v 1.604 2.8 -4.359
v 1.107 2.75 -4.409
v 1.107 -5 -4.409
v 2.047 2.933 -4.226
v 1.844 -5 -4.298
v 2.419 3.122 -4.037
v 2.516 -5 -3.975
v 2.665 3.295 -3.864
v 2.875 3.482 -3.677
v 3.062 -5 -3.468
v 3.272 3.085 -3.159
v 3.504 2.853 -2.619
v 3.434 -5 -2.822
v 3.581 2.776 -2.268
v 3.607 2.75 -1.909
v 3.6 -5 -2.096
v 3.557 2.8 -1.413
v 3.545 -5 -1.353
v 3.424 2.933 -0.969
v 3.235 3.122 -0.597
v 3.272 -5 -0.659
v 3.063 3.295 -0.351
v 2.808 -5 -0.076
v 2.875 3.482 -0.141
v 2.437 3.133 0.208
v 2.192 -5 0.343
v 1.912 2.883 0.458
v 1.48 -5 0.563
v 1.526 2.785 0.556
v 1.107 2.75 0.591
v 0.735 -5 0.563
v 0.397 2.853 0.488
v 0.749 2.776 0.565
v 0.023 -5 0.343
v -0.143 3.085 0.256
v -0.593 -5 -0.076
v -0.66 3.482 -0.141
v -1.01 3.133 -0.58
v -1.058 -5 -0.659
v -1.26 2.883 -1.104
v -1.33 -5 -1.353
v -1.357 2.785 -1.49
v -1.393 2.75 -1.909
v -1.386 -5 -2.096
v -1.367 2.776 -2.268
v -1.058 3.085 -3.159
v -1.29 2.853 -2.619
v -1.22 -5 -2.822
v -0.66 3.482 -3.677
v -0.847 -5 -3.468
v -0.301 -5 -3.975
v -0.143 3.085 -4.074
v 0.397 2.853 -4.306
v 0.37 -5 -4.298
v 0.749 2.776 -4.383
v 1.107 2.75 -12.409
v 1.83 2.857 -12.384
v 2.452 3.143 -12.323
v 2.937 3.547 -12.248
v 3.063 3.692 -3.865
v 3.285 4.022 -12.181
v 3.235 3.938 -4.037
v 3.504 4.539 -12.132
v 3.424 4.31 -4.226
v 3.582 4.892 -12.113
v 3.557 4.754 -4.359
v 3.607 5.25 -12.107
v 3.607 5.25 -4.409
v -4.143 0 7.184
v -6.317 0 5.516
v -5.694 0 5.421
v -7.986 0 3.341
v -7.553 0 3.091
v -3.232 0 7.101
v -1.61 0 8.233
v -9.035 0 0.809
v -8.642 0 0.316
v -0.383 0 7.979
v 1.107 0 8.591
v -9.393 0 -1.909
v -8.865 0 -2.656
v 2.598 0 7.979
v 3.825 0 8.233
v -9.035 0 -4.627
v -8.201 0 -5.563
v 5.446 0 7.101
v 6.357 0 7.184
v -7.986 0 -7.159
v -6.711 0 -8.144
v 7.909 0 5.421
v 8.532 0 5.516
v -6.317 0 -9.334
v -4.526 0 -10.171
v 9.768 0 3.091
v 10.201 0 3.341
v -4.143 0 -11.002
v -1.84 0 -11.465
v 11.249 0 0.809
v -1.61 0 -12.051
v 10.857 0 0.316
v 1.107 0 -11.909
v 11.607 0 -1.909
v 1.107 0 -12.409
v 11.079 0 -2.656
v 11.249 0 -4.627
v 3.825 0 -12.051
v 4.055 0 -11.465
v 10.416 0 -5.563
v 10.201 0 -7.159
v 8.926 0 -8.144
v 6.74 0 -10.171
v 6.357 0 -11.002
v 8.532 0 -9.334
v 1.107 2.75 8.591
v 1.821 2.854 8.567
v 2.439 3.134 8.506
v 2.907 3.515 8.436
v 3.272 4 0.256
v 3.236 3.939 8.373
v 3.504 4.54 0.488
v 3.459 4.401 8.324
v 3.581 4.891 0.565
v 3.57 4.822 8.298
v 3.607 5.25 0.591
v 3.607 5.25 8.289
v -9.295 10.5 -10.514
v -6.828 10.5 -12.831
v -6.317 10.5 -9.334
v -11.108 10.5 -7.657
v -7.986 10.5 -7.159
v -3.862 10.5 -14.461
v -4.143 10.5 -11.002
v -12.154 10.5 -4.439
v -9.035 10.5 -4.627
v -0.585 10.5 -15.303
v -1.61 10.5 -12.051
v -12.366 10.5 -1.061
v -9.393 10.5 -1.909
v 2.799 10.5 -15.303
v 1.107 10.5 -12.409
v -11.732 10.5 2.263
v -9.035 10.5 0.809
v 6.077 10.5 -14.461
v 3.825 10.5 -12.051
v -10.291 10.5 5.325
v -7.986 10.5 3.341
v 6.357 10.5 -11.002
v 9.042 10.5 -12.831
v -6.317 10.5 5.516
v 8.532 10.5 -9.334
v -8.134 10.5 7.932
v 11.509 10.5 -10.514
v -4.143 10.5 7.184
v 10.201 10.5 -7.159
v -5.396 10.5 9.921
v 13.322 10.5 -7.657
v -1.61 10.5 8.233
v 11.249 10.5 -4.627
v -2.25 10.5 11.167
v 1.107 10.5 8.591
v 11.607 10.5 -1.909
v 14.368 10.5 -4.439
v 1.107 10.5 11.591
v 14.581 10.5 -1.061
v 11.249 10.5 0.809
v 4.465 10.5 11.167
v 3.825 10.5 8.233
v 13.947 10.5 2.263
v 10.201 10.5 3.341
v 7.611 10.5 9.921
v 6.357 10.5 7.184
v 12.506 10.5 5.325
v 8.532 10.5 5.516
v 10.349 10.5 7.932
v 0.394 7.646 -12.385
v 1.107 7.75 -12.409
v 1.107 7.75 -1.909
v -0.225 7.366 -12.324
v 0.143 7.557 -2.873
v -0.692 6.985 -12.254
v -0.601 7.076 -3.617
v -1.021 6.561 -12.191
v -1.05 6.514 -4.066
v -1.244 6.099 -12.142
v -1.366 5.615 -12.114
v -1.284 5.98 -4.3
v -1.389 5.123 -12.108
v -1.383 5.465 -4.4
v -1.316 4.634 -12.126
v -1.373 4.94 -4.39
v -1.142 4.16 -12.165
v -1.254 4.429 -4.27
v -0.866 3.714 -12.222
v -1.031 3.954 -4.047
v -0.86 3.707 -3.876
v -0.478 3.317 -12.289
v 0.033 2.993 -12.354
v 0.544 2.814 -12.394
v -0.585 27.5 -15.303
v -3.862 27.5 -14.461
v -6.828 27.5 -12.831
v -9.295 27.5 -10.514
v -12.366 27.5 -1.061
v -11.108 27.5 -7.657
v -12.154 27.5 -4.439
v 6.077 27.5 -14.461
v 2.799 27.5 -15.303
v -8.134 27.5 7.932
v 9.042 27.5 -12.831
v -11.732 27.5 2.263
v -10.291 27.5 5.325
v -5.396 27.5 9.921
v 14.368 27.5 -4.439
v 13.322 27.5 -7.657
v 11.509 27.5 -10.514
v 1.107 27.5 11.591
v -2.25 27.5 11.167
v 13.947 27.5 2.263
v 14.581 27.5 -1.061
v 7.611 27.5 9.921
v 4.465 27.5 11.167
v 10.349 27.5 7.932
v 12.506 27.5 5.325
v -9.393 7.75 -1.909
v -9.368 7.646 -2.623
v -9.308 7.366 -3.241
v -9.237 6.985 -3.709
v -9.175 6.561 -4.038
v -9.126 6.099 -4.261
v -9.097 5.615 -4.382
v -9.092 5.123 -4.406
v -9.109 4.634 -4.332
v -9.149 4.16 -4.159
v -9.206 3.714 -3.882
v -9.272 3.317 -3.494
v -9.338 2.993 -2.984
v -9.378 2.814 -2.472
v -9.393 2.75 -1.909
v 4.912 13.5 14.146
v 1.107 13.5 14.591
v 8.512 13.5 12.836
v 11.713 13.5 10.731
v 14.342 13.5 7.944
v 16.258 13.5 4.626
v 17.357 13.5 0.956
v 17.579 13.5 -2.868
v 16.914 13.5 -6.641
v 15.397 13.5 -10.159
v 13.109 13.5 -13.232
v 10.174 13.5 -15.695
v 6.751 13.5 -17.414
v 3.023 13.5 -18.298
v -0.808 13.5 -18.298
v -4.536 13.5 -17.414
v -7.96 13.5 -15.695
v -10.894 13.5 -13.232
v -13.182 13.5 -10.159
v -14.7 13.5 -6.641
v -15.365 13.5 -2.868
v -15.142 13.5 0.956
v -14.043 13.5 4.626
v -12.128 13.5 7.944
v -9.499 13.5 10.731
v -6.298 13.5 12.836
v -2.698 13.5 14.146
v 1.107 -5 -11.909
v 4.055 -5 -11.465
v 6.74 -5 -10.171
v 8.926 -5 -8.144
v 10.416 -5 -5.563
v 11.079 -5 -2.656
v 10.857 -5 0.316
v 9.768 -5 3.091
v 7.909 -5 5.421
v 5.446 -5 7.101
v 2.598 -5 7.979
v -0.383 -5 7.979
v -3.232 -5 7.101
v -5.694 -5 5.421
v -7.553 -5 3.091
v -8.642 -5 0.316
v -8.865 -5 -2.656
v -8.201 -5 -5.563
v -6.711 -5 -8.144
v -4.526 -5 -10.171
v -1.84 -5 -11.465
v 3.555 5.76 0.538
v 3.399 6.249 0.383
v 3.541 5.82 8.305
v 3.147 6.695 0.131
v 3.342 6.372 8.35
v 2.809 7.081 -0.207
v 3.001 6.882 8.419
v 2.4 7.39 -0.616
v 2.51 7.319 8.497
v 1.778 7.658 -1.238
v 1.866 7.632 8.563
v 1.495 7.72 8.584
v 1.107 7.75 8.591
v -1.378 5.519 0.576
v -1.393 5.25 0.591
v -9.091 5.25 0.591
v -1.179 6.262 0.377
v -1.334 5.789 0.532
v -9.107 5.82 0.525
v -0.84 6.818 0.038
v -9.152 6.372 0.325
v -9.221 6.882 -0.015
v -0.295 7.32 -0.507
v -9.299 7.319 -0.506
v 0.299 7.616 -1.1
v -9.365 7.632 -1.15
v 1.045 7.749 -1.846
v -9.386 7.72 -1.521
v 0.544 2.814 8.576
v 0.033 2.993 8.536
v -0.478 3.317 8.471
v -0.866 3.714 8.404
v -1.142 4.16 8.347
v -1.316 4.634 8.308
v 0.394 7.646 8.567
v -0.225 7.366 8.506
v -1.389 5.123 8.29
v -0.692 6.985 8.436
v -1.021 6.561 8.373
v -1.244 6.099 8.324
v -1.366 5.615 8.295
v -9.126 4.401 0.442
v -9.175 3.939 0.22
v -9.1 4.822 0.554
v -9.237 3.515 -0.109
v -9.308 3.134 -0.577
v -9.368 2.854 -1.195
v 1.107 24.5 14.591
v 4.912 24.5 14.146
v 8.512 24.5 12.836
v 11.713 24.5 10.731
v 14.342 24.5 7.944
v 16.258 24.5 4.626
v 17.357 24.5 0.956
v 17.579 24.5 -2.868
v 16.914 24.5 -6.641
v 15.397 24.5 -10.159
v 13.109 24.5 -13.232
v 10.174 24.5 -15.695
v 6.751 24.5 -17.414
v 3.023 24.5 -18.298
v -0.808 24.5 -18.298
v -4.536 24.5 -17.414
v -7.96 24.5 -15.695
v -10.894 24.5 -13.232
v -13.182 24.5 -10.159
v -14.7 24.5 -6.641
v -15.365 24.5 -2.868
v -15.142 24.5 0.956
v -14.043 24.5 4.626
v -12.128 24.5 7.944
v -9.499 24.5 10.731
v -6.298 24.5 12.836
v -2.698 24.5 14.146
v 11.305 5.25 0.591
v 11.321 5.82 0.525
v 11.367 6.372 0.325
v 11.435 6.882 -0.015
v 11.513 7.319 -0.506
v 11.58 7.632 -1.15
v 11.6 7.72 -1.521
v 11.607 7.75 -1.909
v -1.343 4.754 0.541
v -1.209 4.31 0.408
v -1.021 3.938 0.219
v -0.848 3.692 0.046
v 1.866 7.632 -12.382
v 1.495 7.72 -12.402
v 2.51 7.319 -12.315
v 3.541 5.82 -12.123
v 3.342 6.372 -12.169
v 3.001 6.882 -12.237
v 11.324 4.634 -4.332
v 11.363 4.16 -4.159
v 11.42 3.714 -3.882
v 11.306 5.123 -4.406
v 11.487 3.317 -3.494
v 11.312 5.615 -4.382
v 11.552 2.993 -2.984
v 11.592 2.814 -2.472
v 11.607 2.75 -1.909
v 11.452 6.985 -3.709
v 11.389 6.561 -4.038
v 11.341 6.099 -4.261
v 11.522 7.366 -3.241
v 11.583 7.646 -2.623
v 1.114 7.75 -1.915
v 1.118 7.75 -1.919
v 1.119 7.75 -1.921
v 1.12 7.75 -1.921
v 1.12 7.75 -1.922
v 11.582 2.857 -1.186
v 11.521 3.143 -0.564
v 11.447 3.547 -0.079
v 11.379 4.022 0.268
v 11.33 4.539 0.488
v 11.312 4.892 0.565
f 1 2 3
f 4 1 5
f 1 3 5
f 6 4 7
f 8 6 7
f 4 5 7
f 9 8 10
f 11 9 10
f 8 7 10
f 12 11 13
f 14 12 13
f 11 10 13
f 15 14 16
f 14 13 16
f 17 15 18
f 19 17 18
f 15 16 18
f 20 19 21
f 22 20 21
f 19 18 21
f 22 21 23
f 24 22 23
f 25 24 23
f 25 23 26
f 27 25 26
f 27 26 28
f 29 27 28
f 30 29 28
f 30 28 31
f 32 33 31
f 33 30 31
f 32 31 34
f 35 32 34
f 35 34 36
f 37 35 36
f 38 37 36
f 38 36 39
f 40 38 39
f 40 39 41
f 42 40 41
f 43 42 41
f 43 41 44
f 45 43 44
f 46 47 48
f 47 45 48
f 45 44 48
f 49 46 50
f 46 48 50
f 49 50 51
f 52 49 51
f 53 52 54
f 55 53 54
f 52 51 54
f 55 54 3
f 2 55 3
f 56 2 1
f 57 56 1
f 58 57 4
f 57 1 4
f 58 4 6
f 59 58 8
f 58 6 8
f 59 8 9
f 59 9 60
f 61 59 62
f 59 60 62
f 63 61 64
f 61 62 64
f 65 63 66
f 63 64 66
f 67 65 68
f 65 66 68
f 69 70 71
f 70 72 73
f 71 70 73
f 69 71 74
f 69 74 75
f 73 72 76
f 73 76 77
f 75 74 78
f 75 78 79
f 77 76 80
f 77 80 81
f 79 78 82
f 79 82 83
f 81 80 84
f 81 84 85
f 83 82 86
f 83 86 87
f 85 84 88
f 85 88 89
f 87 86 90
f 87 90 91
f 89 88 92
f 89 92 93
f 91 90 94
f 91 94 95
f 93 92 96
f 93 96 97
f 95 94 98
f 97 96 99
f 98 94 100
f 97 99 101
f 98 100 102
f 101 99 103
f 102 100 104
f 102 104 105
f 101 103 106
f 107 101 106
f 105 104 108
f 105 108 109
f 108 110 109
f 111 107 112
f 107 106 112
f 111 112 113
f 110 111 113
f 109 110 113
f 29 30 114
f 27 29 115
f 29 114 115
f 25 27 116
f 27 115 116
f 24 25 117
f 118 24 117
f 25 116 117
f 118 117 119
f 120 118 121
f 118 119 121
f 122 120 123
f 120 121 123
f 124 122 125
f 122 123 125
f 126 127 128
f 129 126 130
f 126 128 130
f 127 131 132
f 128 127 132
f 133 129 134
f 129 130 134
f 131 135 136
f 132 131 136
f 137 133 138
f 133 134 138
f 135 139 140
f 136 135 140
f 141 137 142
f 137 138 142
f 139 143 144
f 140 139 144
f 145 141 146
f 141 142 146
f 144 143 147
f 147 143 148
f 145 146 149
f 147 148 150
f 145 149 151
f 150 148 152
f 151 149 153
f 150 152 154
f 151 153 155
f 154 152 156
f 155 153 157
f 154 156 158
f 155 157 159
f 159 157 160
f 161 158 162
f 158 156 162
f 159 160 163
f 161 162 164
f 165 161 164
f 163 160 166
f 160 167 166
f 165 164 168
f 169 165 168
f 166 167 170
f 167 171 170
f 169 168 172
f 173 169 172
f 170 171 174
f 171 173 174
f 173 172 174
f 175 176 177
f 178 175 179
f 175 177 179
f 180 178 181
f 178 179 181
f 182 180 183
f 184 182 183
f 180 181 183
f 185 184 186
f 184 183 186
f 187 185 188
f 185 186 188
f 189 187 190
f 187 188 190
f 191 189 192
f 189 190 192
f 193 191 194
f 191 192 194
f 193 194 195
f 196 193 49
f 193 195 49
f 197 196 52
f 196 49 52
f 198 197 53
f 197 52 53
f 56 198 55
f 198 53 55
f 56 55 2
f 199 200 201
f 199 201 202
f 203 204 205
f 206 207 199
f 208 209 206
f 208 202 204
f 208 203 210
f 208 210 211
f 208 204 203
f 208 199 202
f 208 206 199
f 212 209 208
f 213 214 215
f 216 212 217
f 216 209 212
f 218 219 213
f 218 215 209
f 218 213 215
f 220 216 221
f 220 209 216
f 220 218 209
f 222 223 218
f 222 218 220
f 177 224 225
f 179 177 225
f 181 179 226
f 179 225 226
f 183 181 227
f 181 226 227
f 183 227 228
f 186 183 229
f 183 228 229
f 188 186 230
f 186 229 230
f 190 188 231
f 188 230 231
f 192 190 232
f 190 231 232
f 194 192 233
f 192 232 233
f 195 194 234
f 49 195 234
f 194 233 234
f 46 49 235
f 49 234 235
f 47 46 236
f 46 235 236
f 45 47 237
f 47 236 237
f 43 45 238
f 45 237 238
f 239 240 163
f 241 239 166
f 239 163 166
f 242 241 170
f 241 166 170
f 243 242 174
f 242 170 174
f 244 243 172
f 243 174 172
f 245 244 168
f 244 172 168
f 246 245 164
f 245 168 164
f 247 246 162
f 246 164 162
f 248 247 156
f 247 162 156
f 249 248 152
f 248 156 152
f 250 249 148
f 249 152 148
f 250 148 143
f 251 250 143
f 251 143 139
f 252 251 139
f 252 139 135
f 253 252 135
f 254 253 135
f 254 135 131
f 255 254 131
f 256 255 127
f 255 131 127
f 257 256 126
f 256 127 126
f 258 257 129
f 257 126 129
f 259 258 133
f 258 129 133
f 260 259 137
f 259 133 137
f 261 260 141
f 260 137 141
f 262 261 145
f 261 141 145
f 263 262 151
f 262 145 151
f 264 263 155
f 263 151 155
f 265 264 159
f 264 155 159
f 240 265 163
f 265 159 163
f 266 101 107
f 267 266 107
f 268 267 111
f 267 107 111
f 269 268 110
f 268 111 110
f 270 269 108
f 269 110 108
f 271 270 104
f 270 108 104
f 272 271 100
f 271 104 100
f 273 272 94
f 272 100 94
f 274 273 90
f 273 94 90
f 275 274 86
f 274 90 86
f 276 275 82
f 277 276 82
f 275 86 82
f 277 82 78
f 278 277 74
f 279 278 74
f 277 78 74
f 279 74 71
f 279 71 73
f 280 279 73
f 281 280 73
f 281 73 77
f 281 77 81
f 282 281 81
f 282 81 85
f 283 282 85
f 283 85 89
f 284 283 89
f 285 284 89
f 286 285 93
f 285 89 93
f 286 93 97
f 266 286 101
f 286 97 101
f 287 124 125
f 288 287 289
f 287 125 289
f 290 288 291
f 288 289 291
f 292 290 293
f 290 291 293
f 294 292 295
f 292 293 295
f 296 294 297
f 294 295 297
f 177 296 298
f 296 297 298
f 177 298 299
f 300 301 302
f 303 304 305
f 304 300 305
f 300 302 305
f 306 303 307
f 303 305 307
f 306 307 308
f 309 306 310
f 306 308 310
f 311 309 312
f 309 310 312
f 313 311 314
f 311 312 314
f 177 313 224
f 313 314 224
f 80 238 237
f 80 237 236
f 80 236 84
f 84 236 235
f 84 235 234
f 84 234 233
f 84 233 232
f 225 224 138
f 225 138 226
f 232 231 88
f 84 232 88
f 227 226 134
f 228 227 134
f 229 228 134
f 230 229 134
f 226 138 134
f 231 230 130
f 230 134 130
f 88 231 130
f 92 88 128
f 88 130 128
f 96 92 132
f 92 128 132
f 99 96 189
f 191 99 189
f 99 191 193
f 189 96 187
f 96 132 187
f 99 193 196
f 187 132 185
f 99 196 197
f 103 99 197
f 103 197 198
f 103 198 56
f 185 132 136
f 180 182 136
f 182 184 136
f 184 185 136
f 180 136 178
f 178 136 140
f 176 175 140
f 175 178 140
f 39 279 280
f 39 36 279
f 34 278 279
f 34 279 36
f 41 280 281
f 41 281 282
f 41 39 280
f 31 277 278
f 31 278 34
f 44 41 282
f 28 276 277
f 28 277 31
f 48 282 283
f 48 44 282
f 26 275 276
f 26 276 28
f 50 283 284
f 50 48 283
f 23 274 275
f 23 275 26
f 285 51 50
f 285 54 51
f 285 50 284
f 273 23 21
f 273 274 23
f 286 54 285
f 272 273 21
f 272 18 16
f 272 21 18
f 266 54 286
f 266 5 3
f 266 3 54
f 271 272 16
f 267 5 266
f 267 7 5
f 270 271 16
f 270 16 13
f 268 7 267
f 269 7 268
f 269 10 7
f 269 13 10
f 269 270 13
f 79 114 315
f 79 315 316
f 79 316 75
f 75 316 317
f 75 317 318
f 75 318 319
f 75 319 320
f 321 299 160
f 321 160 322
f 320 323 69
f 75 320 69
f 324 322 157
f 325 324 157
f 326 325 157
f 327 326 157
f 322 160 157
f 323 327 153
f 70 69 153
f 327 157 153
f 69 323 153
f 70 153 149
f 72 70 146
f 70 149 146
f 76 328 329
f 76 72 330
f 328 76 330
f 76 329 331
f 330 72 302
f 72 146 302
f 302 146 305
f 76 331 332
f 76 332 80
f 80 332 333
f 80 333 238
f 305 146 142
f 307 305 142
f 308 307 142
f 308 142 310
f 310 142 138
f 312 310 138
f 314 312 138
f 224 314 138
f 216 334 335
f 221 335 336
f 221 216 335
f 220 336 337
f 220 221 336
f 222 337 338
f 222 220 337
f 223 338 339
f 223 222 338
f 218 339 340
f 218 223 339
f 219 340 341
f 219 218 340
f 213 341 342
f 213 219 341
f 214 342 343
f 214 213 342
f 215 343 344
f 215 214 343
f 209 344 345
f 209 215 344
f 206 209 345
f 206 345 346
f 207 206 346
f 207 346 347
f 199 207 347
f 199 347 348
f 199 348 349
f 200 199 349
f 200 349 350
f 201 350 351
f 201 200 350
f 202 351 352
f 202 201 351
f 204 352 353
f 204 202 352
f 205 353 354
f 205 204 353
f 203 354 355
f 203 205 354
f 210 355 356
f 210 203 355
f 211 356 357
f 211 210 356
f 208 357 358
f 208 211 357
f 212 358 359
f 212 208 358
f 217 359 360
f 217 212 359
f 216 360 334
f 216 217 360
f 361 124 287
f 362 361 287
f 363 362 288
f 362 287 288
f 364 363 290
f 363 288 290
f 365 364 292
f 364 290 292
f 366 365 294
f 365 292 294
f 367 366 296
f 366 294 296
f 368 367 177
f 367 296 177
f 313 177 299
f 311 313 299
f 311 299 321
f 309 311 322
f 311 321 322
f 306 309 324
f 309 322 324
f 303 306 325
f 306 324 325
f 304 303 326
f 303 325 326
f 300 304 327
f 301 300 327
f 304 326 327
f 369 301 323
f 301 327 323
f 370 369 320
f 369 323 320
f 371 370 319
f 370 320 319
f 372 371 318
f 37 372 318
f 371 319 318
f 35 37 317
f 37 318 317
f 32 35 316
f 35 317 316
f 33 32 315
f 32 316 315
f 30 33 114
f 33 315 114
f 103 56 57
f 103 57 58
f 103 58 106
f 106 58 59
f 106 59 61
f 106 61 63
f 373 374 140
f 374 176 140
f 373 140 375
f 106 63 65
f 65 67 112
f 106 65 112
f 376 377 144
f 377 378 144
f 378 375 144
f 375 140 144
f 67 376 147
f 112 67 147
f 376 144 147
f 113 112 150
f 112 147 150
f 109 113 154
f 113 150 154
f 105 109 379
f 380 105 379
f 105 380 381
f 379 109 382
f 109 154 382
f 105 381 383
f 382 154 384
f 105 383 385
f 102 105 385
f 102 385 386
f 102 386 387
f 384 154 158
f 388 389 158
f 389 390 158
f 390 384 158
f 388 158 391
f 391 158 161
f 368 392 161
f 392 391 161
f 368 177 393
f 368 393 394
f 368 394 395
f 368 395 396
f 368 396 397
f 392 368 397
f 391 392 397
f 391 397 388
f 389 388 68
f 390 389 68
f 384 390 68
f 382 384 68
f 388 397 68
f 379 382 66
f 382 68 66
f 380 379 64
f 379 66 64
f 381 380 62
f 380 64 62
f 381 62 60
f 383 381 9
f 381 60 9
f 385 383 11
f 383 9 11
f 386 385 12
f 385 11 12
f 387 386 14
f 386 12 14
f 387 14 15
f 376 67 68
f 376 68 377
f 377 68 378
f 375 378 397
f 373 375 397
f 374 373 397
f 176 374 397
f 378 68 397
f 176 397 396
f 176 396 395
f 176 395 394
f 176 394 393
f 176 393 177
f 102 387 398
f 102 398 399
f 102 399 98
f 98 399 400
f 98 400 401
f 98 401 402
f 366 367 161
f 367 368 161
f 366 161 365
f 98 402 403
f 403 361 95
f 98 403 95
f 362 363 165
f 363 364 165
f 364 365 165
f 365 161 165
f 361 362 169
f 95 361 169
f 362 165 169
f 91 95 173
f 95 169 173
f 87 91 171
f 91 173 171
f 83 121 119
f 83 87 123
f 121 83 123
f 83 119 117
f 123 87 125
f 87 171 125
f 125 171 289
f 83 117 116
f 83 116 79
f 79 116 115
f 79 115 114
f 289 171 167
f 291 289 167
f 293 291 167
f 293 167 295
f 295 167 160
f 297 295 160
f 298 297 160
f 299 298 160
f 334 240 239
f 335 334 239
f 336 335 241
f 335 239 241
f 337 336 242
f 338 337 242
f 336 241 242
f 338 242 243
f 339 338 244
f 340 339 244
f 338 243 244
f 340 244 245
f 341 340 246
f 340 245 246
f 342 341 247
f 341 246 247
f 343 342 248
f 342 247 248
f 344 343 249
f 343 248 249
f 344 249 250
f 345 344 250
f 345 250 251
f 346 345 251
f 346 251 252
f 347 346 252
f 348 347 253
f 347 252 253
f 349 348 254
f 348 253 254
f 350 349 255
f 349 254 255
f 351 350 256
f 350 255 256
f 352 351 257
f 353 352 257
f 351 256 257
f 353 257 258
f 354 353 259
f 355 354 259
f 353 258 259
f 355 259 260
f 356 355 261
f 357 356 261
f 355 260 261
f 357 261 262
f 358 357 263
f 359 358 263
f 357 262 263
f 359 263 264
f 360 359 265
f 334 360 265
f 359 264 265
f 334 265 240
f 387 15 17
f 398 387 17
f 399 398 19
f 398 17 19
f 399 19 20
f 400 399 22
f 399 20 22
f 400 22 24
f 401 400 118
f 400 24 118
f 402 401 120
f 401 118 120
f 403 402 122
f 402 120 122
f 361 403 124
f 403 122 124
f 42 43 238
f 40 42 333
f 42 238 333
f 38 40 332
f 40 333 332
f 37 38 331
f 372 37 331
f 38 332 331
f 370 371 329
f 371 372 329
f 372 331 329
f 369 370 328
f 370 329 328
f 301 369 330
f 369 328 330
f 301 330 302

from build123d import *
from build123d.topology import SkipClean

# Parameters (mm, degrees)
SKETCH1_W           = 21
SKETCH1_H           = 21
BOSS_EXTRUDE1_DEPTH = 10.5
CUT_EXTRUDE1_DEPTH  = 24.5
CUT_EXTRUDE2_DEPTH  = 24.5
CUT_EXTRUDE3_DEPTH  = 24.5
SKETCH5_R           = 16.5
BOSS_EXTRUDE2_DEPTH = 17
CHAMFER4_SIZE       = 3
CHAMFER5_SIZE       = 3
SKETCH13_R          = 10
BOSS_EXTRUDE6_DEPTH = 5
SKETCH14_R          = 2.5
CUT_EXTRUDE7_DEPTH  = 10


with BuildPart() as part:
    # Sketch1 → Boss-Extrude1 (new body)
    with BuildSketch(Plane(origin=(0, 0, 0), x_dir=(1, 0, 0), z_dir=(0, 1, 0))):
        with Locations((1.107272727, 1.909090909)):
            Rectangle(SKETCH1_W, SKETCH1_H)
    extrude(amount=BOSS_EXTRUDE1_DEPTH)

    # Sketch2 → Cut-Extrude1 (cut)
    with BuildSketch(Plane.XY.offset(8.590909091)):
        with BuildLine():
            ThreePointArc((3.607272727, 5.25), (2.87503968, 7.017766953), (1.107272727, 7.75))
            Line((1.107272727, 7.75), (1.107272727, 2.75))
            ThreePointArc((1.107272727, 2.75), (2.87503968, 3.482233047), (3.607272727, 5.25))
        make_face()
        with BuildLine():
            Line((1.107272727, 2.75), (1.107272727, 7.75))
            ThreePointArc((1.107272727, 7.75), (-1.392727273, 5.25), (1.107272727, 2.75))
        make_face()
    extrude(amount=-CUT_EXTRUDE1_DEPTH, mode=Mode.SUBTRACT)

    # Sketch3 → Cut-Extrude2 (cut)
    with BuildSketch(Plane.ZY.offset(9.392727273)):
        with BuildLine():
            ThreePointArc((0.590909091, 5.25), (-0.141323956, 7.017766953), (-1.909090909, 7.75))
            Line((-1.909090909, 7.75), (-1.909090909, 2.75))
            ThreePointArc((-1.909090909, 2.75), (-0.141323956, 3.482233047), (0.590909091, 5.25))
        make_face()
        with BuildLine():
            Line((-1.909090909, 2.75), (-1.909090909, 7.75))
            ThreePointArc((-1.909090909, 7.75), (-4.409090909, 5.25), (-1.909090909, 2.75))
        make_face()
    extrude(amount=-CUT_EXTRUDE2_DEPTH, mode=Mode.SUBTRACT)

    # Sketch4 → Cut-Extrude3 (cut)
    with SkipClean():  # the faces are left unmerged after this step: merging them gives an invalid solid
        with BuildSketch(Plane(origin=(0, 10.5, 0), x_dir=(1, 0, 0), z_dir=(0, 1, 0))):
            with BuildLine():
                ThreePointArc((-9.392727273, 1.909090919), (-6.317348472, 9.333712115), (1.107272727, 12.409090909))
                Line((1.107272727, 12.409090909), (-9.392727273, 12.409090909))
                Line((-9.392727273, 12.409090909), (-9.392727273, 1.909090919))
            make_face()
            with BuildLine():
                Line((11.607272727, 12.409090909), (1.107272727, 12.409090909))
                ThreePointArc((1.107272727, 12.409090909), (8.53189393, 9.333712112), (11.607272727, 1.909090909))
                Line((11.607272727, 1.909090909), (11.607272727, 12.409090909))
            make_face()
            with BuildLine():
                ThreePointArc((11.607272727, 1.909090909), (8.53189393, -5.515530293), (1.107272727, -8.590909091))
                Line((1.107272727, -8.590909091), (11.607272727, -8.590909091))
                Line((11.607272727, -8.590909091), (11.607272727, 1.909090909))
            make_face()
            with BuildLine():
                Line((-9.392727273, -8.590909091), (1.107272727, -8.590909091))
                ThreePointArc((1.107272727, -8.590909091), (-6.317348479, -5.51553029), (-9.392727273, 1.909090919))
                Line((-9.392727273, 1.909090919), (-9.392727273, -8.590909091))
            make_face()
        extrude(amount=-CUT_EXTRUDE3_DEPTH, mode=Mode.SUBTRACT)

    # Sketch5 → Boss-Extrude2 (add)
    with SkipClean():  # the faces are left unmerged after this step: merging them gives an invalid solid
        with BuildSketch(Plane(origin=(0, 10.5, 0), x_dir=(1, 0, 0), z_dir=(0, 1, 0))):
            with Locations(Location((1.107272727, 1.909090909, 0), (0, 0, 270))):
                Circle(SKETCH5_R)
        extrude(amount=BOSS_EXTRUDE2_DEPTH)

    # Chamfer4
    chamfer4_edges = [part.edges().sort_by_distance(p)[0] for p in [
        (1.107272727, 27.5, -18.409090909),
    ]]
    chamfer(chamfer4_edges, length=CHAMFER4_SIZE)

    # Chamfer5
    chamfer5_edges = [part.edges().sort_by_distance(p)[0] for p in [
        (1.107272727, 10.5, -18.409090909),
    ]]
    chamfer(chamfer5_edges, length=CHAMFER5_SIZE)

    # Sketch13 → Boss-Extrude6 (add)
    with SkipClean():  # the faces are left unmerged after this step: merging them gives an invalid solid
        with BuildSketch(Plane.XZ):
            with Locations(Location((1.107272727, -1.909090909, 0), (0, 0, 270))):
                Circle(SKETCH13_R)
        extrude(amount=BOSS_EXTRUDE6_DEPTH)

    # Sketch14 → Cut-Extrude7 (cut)
    with SkipClean():  # the faces are left unmerged after this step: merging them gives an invalid solid
        with BuildSketch(Plane.XZ.offset(5)):
            with Locations(Location((1.107272727, -1.909090909, 0), (0, 0, 270))):
                Circle(SKETCH14_R)
        extrude(amount=-CUT_EXTRUDE7_DEPTH, mode=Mode.SUBTRACT)


solid = part.part
